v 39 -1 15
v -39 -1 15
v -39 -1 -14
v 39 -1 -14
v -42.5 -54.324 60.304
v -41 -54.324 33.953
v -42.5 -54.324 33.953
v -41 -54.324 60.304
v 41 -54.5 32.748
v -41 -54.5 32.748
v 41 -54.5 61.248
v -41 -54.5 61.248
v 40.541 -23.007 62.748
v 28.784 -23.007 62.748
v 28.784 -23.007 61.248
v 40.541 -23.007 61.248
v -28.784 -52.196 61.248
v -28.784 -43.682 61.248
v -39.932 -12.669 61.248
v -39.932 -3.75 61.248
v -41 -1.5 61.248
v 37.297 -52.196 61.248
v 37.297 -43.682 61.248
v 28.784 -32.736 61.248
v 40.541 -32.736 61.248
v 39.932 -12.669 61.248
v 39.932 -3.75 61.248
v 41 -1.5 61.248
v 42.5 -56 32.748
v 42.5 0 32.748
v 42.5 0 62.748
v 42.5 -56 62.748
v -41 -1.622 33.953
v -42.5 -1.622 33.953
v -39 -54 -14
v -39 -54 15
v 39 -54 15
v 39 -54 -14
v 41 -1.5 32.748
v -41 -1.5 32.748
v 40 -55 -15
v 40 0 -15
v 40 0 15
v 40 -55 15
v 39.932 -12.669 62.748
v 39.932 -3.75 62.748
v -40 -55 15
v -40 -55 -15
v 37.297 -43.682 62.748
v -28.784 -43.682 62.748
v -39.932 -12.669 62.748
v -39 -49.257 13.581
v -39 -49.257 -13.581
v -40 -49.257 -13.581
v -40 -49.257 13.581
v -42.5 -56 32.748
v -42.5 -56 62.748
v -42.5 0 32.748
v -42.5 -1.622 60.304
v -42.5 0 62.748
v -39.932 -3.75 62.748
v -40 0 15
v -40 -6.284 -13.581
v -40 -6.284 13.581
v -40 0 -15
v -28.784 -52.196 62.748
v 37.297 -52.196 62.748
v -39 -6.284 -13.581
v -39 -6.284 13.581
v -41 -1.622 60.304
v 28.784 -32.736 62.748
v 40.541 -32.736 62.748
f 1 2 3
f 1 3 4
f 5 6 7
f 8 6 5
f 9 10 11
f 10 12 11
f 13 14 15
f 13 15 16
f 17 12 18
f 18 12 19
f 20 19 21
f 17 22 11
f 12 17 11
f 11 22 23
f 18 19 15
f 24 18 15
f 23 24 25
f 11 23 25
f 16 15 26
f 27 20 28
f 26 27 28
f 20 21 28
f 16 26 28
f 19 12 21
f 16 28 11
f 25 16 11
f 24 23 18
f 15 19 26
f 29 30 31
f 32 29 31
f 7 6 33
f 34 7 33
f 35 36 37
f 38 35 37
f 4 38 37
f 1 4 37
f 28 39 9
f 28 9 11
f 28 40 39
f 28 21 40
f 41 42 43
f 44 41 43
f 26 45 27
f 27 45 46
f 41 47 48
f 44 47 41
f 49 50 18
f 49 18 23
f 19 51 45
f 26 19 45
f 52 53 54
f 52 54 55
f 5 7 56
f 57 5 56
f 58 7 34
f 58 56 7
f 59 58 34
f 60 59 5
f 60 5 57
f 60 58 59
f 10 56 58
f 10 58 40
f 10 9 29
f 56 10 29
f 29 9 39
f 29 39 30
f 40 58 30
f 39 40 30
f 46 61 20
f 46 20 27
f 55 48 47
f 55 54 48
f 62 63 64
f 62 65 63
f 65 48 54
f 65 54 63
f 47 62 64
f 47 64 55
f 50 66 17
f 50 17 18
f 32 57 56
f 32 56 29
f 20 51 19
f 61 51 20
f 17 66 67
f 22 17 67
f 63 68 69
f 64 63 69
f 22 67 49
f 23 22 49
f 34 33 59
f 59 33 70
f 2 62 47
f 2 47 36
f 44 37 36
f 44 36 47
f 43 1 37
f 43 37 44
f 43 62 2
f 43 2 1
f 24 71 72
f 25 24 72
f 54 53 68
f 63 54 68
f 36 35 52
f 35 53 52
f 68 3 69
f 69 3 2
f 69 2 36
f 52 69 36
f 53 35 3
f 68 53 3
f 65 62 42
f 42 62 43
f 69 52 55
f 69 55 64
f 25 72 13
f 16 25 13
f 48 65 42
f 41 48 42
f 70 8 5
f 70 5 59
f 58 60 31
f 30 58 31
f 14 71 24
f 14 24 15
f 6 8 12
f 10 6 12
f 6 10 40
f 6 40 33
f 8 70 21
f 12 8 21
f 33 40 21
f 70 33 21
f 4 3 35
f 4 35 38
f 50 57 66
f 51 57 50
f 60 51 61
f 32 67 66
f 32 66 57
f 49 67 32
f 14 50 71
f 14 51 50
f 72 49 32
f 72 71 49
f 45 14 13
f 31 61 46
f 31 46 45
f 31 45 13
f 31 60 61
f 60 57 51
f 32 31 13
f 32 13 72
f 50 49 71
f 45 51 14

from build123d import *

# Parameters (mm, degrees)
F0_W      = 80
F0_H      = 30
F1_DEPTH  = 55
F2_T      = -1
F3_W      = 85
F3_H      = 30
F4_DEPTH  = 56
F5_T      = -1.5
F6_W      = 52.702705
F6_H      = 26.351357
F7_DEPTH  = 50
F8_W      = 42.972975
F8_H      = 27.162162
F9_DEPTH  = 50
F10_W     = 79.86487
F10_H     = 8.918919
F11_DEPTH = 25
F12_W     = 66.081084
F12_H     = 8.513503
F13_DEPTH = 25
F14_W     = 11.756755
F14_H     = 9.729728
F15_DEPTH = 25


with BuildPart() as f1:
    # F0 (on Front) → F1 (new body)
    with BuildSketch(Plane.XZ):
        Rectangle(F0_W, F0_H)
    extrude(amount=F1_DEPTH)

    # F2
    f2_openings = [f1.faces().sort_by_distance(p)[0] for p in [
        (0, -27.5, 15),
    ]]
    offset(amount=F2_T, openings=f2_openings)

    # F8 (on Right) → F9 (cut)
    with BuildSketch(Plane.YZ):
        with Locations((-27.770271, 0)):
            Rectangle(F8_W, F8_H)
    extrude(amount=-F9_DEPTH, mode=Mode.SUBTRACT)


with BuildPart() as f4:
    # F3 (on Front) → F4 (new body)
    with BuildSketch(Plane.XZ):
        with Locations((0, 47.748494)):
            Rectangle(F3_W, F3_H)
    extrude(amount=F4_DEPTH)

    # F5
    f5_openings = [f4.faces().sort_by_distance(p)[0] for p in [
        (0, -28, 32.748494),
    ]]
    offset(amount=F5_T, openings=f5_openings)

    # F6 (on Right) → F7 (cut)
    with BuildSketch(Plane.YZ):
        with Locations((-27.97297, 47.128379)):
            Rectangle(F6_W, F6_H)
    extrude(amount=-F7_DEPTH, mode=Mode.SUBTRACT)

    # F10 (on face) → F11 (cut)
    with BuildSketch(Plane.XY.offset(62.748494)):
        with Locations((0, -8.209459)):
            Rectangle(F10_W, F10_H)
    extrude(amount=-F11_DEPTH, mode=Mode.SUBTRACT)

    # F12 (on face) → F13 (cut)
    with BuildSketch(Plane.XY.offset(62.748494)):
        with Locations((4.256756, -47.939189)):
            Rectangle(F12_W, F12_H)
    extrude(amount=-F13_DEPTH, mode=Mode.SUBTRACT)

    # F14 (on face) → F15 (cut)
    with BuildSketch(Plane.XY.offset(62.748494)):
        with Locations((34.662168, -27.871622)):
            Rectangle(F14_W, F14_H)
    extrude(amount=-F15_DEPTH, mode=Mode.SUBTRACT)


solid = Compound([f1.part, f4.part])
